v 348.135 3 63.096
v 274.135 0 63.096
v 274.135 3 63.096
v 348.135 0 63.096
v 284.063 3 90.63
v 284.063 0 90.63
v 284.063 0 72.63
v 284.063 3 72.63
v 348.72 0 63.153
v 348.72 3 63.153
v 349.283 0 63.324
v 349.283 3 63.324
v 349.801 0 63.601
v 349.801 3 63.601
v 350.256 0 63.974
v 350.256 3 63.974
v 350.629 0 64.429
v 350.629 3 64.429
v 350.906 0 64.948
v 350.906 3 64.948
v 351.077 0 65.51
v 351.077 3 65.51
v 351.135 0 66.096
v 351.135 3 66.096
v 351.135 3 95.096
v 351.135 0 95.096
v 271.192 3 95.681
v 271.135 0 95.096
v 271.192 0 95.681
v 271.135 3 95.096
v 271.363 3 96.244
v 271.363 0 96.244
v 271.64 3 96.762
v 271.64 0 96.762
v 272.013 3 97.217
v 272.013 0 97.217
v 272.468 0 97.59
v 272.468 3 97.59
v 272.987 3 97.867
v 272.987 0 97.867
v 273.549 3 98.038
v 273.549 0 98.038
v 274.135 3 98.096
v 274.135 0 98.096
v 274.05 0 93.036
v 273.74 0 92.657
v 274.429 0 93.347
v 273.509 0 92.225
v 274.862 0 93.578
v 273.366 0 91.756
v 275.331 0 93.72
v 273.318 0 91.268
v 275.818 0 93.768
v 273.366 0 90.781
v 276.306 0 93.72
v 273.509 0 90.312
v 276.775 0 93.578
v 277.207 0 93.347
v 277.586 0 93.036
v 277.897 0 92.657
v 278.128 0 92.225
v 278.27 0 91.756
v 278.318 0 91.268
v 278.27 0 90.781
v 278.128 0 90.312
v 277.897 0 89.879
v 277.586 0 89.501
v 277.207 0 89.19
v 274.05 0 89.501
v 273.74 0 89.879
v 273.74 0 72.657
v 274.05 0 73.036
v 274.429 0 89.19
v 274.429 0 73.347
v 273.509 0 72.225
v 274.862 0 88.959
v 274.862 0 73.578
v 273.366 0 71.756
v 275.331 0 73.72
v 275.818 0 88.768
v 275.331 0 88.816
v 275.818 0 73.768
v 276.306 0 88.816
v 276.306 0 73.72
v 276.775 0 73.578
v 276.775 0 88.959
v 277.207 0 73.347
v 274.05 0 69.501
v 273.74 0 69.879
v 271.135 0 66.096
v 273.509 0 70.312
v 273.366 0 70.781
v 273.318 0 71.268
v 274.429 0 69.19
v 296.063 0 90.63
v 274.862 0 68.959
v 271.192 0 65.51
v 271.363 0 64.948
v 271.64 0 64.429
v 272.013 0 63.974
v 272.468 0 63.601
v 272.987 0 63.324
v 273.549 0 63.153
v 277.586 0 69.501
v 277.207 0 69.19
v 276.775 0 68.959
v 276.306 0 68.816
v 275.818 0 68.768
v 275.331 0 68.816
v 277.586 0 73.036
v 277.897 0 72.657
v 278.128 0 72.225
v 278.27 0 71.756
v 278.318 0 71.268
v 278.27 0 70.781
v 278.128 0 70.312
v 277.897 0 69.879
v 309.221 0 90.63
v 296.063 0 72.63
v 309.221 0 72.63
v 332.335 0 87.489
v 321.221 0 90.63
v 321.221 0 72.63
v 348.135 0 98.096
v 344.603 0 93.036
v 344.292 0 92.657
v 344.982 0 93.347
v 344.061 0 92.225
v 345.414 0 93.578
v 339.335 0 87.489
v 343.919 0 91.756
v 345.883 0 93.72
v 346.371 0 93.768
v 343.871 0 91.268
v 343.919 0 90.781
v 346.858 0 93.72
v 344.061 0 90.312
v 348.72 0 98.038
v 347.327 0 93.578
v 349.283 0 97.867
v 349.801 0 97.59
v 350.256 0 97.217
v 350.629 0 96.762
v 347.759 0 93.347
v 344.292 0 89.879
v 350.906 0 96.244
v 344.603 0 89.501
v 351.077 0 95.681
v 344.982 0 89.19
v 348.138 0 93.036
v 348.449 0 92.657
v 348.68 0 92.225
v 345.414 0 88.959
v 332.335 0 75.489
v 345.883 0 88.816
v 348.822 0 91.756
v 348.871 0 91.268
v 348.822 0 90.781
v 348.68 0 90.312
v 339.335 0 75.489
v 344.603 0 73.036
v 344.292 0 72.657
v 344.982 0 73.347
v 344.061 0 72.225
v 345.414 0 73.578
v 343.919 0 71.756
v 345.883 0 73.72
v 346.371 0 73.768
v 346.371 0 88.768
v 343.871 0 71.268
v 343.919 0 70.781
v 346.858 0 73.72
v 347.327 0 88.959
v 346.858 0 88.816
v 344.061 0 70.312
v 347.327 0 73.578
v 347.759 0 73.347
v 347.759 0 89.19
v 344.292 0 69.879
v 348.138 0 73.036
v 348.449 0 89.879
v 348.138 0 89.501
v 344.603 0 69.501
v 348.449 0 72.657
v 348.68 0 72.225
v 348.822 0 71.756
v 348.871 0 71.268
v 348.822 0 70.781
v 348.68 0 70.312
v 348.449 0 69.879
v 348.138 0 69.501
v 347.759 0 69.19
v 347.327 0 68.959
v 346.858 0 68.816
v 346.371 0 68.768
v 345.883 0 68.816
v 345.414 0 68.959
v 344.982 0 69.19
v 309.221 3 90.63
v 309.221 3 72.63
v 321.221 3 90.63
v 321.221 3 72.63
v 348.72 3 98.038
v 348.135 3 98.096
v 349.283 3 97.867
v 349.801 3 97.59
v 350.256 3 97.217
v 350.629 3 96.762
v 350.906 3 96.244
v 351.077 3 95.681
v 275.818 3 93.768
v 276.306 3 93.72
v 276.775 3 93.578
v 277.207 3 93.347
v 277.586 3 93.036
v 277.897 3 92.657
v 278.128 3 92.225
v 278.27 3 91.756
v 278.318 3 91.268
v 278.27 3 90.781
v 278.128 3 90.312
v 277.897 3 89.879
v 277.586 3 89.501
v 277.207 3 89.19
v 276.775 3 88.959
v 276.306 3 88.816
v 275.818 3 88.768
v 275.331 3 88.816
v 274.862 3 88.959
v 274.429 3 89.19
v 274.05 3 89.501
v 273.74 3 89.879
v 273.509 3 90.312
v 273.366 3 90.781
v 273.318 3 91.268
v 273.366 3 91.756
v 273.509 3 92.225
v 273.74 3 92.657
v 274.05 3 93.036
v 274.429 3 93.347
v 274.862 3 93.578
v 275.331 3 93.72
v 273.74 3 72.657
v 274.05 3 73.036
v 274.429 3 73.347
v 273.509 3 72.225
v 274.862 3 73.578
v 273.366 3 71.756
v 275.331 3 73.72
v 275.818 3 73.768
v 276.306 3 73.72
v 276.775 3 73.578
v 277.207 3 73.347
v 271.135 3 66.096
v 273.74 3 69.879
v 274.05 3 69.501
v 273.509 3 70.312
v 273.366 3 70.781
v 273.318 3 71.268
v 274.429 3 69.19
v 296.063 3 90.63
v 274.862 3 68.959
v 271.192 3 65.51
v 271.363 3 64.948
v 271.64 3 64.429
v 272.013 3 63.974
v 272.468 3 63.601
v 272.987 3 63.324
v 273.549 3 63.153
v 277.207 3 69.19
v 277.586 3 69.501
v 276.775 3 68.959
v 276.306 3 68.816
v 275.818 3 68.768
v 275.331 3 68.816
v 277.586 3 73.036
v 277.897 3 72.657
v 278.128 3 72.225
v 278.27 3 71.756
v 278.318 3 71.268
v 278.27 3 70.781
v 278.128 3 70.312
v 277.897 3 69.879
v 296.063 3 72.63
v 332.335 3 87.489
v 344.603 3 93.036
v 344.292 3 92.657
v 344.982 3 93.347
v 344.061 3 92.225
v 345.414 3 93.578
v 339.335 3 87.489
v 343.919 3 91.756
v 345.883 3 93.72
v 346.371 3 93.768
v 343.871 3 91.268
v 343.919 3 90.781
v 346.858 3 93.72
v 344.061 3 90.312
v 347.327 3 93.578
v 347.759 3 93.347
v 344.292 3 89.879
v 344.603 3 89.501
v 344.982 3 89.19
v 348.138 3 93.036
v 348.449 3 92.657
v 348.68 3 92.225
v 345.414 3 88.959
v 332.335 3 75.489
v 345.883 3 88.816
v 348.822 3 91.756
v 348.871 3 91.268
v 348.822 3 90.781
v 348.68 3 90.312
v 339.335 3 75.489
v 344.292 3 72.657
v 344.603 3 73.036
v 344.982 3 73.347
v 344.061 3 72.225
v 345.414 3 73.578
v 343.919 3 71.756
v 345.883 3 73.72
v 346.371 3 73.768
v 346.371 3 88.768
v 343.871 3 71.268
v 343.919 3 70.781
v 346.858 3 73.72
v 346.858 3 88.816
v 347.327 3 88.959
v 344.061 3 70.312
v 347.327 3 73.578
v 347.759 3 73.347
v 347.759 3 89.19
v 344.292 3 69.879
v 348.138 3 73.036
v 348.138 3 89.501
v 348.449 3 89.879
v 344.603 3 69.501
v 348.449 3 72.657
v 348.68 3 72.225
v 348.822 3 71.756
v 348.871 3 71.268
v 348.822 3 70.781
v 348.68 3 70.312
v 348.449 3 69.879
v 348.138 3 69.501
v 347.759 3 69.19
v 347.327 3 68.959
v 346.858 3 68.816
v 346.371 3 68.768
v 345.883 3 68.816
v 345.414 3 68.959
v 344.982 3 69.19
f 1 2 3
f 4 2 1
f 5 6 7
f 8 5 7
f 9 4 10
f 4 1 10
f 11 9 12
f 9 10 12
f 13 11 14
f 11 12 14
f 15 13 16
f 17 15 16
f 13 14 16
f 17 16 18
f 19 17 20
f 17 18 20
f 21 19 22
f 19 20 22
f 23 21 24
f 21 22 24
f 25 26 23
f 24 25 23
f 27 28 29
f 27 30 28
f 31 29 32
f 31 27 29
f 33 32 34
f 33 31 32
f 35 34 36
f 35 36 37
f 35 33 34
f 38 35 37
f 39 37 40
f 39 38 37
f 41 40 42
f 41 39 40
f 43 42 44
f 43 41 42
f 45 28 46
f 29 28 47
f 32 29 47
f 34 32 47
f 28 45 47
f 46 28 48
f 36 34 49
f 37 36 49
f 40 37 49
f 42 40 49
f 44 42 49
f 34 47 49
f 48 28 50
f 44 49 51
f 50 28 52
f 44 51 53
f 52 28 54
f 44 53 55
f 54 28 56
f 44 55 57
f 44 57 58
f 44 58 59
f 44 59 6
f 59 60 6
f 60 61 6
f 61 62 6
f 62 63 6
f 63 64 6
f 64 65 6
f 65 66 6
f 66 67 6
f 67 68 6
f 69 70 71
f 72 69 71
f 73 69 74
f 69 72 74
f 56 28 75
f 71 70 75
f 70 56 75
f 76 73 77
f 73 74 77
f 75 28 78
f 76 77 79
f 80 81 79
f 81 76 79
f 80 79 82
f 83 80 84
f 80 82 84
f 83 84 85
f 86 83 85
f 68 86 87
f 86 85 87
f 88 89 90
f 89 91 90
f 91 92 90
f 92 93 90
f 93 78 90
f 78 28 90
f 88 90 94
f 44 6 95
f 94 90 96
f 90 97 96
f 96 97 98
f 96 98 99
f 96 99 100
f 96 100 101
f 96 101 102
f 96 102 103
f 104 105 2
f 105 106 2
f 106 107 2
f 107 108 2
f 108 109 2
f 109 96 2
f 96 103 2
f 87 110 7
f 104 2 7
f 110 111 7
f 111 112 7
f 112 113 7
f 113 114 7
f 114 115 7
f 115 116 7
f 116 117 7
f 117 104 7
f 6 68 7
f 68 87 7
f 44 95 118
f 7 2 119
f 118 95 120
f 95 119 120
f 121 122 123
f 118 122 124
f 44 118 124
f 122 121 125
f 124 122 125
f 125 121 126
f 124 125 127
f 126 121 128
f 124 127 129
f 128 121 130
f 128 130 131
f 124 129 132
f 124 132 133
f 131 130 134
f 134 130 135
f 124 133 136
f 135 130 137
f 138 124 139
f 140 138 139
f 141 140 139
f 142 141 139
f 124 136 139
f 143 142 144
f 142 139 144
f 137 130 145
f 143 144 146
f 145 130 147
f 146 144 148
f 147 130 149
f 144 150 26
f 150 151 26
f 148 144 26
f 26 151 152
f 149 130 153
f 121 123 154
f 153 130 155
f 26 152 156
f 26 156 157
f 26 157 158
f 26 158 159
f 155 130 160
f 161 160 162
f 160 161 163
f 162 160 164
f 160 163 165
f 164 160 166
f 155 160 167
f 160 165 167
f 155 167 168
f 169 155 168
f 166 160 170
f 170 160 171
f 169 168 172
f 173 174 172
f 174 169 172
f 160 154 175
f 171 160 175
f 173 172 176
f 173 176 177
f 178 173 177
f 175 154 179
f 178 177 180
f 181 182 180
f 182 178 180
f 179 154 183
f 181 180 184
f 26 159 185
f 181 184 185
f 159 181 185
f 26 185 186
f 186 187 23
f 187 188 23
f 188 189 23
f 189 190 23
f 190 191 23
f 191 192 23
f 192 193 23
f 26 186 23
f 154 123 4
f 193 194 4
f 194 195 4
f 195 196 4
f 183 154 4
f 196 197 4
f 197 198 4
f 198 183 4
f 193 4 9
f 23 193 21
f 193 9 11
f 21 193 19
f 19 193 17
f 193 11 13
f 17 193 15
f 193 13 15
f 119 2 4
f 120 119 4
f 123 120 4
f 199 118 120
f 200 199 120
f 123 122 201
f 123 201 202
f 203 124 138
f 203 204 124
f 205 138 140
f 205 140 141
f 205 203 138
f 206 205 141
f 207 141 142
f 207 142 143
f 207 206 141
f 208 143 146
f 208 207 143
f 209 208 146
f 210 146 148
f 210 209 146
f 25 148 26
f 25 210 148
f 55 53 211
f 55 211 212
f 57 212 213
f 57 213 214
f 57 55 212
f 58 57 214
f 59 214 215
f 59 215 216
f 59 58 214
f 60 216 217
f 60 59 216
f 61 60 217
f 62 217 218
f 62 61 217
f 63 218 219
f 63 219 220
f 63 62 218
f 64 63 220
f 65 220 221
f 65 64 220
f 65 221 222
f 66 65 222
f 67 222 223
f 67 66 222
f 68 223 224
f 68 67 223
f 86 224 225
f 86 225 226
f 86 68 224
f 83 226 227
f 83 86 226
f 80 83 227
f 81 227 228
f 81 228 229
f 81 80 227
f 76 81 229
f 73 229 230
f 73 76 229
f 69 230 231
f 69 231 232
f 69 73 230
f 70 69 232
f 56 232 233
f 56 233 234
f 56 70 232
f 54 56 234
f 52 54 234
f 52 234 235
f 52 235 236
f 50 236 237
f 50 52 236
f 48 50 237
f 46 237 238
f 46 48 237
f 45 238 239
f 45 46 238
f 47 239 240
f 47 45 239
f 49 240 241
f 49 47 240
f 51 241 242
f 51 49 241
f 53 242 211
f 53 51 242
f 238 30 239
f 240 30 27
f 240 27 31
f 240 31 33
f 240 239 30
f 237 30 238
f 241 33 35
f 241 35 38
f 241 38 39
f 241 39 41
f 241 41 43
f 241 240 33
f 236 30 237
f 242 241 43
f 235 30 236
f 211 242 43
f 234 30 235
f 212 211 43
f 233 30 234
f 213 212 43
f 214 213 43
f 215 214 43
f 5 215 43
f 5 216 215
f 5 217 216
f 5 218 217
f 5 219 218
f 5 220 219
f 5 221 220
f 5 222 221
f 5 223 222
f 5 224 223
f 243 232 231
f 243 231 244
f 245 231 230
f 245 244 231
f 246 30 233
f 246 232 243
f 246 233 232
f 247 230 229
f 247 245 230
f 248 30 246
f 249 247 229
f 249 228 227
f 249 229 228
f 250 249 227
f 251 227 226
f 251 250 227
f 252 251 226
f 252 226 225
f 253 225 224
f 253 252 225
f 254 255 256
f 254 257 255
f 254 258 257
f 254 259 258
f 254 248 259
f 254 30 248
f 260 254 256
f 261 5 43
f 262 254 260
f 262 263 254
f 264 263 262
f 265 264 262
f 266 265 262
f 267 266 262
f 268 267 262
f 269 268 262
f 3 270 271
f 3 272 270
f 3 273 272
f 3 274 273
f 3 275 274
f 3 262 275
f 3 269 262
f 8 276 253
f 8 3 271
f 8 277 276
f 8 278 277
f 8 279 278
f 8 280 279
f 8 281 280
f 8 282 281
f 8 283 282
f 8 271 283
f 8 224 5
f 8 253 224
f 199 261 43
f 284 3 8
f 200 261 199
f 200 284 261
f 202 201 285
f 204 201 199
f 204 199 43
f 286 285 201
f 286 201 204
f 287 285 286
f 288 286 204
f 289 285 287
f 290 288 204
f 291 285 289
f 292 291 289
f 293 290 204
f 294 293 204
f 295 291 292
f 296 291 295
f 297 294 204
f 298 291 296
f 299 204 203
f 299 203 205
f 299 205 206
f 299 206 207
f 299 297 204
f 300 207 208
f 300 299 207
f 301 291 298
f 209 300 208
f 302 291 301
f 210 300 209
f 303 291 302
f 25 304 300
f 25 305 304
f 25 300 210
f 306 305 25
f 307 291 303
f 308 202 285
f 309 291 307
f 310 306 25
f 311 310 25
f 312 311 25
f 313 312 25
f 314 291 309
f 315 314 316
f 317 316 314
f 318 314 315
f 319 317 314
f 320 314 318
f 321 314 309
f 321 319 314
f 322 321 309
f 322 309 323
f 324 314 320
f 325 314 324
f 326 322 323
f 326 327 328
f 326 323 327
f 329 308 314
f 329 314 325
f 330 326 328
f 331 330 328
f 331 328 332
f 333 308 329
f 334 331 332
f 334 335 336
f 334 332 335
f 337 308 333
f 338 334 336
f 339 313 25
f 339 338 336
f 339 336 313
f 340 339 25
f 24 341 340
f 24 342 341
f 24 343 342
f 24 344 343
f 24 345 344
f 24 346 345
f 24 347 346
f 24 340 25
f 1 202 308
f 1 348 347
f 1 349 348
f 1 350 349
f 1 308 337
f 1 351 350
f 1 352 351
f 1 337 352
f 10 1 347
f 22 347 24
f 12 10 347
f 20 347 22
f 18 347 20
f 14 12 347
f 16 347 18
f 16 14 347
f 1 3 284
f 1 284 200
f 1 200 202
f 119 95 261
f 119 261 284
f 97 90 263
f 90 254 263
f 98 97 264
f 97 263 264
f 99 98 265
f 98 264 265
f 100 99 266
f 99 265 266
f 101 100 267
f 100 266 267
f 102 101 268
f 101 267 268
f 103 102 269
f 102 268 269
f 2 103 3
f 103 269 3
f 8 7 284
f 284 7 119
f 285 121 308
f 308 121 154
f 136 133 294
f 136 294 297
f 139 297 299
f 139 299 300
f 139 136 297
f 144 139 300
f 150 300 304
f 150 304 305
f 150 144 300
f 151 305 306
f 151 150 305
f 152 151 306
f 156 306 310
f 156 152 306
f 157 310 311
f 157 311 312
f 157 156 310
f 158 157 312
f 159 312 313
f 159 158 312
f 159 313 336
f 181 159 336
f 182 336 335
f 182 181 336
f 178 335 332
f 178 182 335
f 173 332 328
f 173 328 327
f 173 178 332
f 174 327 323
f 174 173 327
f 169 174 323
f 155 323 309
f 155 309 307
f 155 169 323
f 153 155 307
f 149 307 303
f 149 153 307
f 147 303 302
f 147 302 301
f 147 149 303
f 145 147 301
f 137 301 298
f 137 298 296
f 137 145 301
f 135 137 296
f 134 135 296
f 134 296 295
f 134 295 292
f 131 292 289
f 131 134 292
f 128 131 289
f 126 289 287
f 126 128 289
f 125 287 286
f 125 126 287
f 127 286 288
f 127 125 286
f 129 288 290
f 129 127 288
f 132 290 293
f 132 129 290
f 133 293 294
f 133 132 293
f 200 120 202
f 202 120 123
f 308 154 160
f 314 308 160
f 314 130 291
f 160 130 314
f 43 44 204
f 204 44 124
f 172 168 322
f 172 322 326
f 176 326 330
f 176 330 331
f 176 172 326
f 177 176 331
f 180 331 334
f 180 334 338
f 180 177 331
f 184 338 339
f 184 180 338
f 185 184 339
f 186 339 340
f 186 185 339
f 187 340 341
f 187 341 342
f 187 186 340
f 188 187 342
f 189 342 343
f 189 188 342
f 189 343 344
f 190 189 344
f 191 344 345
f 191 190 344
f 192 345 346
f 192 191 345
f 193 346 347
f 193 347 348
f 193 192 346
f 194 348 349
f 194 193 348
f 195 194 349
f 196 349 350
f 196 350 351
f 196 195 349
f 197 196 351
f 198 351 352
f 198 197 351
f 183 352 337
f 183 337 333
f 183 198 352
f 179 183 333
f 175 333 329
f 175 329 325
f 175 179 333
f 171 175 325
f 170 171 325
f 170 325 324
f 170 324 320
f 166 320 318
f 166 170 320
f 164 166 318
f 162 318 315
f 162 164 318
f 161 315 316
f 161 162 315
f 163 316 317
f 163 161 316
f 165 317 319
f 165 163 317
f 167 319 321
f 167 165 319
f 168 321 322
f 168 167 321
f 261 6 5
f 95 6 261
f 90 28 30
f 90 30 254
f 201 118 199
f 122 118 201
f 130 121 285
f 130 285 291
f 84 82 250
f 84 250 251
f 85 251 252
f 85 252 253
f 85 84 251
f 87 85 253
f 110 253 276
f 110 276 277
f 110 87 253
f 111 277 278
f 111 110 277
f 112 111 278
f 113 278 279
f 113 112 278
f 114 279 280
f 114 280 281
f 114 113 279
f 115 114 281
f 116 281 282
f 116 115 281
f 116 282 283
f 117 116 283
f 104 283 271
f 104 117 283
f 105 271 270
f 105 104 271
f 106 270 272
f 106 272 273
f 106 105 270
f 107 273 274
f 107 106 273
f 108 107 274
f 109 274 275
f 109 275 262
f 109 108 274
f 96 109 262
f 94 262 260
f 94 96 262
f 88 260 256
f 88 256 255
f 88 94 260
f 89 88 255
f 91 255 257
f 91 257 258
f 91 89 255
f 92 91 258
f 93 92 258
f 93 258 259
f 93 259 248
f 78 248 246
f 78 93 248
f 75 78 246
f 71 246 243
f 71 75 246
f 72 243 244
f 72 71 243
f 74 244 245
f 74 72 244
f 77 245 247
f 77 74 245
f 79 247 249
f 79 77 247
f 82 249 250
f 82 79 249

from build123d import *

# Parameters (mm, degrees)
SKETCH1_W           = 80
SKETCH1_H           = 35
SKETCH1_R           = 2.5
SKETCH1_W_2         = 12
SKETCH1_H_2         = 18
SKETCH1_W_3         = 7
SKETCH1_H_3         = 12
BOSS_EXTRUDE1_DEPTH = 3
FILLET1_R           = 3


with BuildPart() as part:
    # Sketch1 → Boss-Extrude1 (new body)
    with BuildSketch(Plane(origin=(0, 0, 0), x_dir=(1, 0, 0), z_dir=(0, 1, 0))):
        with Locations((311.134650114, -80.595715333)):
            Rectangle(SKETCH1_W, SKETCH1_H)
        with Locations(Location((275.818253153, -71.268297863, 0), (0, 0, 270))):
            Circle(SKETCH1_R, mode=Mode.SUBTRACT)
        with Locations(Location((275.818253153, -91.268297863, 0), (0, 0, 270))):
            Circle(SKETCH1_R, mode=Mode.SUBTRACT)
        with Locations(Location((346.370521359, -71.268297863, 0), (0, 0, 270))):
            Circle(SKETCH1_R, mode=Mode.SUBTRACT)
        with Locations(Location((346.370521359, -91.268297863, 0), (0, 0, 270))):
            Circle(SKETCH1_R, mode=Mode.SUBTRACT)
        with Locations((315.220523964, -81.629701497)):
            Rectangle(SKETCH1_W_2, SKETCH1_H_2, mode=Mode.SUBTRACT)
        with Locations((290.062529159, -81.629701497)):
            Rectangle(SKETCH1_W_2, SKETCH1_H_2, mode=Mode.SUBTRACT)
        with Locations((335.834815931, -81.489103707)):
            Rectangle(SKETCH1_W_3, SKETCH1_H_3, mode=Mode.SUBTRACT)
    extrude(amount=BOSS_EXTRUDE1_DEPTH)

    # Fillet1
    fillet1_edges = [part.edges().sort_by_distance(p)[0] for p in [
        (271.134650114, 1.5, 63.095715333),
        (351.134650114, 1.5, 63.095715333),
        (351.134650114, 1.5, 98.095715333),
        (271.134650114, 1.5, 98.095715333),
    ]]
    fillet(fillet1_edges, radius=FILLET1_R)


solid = part.part
